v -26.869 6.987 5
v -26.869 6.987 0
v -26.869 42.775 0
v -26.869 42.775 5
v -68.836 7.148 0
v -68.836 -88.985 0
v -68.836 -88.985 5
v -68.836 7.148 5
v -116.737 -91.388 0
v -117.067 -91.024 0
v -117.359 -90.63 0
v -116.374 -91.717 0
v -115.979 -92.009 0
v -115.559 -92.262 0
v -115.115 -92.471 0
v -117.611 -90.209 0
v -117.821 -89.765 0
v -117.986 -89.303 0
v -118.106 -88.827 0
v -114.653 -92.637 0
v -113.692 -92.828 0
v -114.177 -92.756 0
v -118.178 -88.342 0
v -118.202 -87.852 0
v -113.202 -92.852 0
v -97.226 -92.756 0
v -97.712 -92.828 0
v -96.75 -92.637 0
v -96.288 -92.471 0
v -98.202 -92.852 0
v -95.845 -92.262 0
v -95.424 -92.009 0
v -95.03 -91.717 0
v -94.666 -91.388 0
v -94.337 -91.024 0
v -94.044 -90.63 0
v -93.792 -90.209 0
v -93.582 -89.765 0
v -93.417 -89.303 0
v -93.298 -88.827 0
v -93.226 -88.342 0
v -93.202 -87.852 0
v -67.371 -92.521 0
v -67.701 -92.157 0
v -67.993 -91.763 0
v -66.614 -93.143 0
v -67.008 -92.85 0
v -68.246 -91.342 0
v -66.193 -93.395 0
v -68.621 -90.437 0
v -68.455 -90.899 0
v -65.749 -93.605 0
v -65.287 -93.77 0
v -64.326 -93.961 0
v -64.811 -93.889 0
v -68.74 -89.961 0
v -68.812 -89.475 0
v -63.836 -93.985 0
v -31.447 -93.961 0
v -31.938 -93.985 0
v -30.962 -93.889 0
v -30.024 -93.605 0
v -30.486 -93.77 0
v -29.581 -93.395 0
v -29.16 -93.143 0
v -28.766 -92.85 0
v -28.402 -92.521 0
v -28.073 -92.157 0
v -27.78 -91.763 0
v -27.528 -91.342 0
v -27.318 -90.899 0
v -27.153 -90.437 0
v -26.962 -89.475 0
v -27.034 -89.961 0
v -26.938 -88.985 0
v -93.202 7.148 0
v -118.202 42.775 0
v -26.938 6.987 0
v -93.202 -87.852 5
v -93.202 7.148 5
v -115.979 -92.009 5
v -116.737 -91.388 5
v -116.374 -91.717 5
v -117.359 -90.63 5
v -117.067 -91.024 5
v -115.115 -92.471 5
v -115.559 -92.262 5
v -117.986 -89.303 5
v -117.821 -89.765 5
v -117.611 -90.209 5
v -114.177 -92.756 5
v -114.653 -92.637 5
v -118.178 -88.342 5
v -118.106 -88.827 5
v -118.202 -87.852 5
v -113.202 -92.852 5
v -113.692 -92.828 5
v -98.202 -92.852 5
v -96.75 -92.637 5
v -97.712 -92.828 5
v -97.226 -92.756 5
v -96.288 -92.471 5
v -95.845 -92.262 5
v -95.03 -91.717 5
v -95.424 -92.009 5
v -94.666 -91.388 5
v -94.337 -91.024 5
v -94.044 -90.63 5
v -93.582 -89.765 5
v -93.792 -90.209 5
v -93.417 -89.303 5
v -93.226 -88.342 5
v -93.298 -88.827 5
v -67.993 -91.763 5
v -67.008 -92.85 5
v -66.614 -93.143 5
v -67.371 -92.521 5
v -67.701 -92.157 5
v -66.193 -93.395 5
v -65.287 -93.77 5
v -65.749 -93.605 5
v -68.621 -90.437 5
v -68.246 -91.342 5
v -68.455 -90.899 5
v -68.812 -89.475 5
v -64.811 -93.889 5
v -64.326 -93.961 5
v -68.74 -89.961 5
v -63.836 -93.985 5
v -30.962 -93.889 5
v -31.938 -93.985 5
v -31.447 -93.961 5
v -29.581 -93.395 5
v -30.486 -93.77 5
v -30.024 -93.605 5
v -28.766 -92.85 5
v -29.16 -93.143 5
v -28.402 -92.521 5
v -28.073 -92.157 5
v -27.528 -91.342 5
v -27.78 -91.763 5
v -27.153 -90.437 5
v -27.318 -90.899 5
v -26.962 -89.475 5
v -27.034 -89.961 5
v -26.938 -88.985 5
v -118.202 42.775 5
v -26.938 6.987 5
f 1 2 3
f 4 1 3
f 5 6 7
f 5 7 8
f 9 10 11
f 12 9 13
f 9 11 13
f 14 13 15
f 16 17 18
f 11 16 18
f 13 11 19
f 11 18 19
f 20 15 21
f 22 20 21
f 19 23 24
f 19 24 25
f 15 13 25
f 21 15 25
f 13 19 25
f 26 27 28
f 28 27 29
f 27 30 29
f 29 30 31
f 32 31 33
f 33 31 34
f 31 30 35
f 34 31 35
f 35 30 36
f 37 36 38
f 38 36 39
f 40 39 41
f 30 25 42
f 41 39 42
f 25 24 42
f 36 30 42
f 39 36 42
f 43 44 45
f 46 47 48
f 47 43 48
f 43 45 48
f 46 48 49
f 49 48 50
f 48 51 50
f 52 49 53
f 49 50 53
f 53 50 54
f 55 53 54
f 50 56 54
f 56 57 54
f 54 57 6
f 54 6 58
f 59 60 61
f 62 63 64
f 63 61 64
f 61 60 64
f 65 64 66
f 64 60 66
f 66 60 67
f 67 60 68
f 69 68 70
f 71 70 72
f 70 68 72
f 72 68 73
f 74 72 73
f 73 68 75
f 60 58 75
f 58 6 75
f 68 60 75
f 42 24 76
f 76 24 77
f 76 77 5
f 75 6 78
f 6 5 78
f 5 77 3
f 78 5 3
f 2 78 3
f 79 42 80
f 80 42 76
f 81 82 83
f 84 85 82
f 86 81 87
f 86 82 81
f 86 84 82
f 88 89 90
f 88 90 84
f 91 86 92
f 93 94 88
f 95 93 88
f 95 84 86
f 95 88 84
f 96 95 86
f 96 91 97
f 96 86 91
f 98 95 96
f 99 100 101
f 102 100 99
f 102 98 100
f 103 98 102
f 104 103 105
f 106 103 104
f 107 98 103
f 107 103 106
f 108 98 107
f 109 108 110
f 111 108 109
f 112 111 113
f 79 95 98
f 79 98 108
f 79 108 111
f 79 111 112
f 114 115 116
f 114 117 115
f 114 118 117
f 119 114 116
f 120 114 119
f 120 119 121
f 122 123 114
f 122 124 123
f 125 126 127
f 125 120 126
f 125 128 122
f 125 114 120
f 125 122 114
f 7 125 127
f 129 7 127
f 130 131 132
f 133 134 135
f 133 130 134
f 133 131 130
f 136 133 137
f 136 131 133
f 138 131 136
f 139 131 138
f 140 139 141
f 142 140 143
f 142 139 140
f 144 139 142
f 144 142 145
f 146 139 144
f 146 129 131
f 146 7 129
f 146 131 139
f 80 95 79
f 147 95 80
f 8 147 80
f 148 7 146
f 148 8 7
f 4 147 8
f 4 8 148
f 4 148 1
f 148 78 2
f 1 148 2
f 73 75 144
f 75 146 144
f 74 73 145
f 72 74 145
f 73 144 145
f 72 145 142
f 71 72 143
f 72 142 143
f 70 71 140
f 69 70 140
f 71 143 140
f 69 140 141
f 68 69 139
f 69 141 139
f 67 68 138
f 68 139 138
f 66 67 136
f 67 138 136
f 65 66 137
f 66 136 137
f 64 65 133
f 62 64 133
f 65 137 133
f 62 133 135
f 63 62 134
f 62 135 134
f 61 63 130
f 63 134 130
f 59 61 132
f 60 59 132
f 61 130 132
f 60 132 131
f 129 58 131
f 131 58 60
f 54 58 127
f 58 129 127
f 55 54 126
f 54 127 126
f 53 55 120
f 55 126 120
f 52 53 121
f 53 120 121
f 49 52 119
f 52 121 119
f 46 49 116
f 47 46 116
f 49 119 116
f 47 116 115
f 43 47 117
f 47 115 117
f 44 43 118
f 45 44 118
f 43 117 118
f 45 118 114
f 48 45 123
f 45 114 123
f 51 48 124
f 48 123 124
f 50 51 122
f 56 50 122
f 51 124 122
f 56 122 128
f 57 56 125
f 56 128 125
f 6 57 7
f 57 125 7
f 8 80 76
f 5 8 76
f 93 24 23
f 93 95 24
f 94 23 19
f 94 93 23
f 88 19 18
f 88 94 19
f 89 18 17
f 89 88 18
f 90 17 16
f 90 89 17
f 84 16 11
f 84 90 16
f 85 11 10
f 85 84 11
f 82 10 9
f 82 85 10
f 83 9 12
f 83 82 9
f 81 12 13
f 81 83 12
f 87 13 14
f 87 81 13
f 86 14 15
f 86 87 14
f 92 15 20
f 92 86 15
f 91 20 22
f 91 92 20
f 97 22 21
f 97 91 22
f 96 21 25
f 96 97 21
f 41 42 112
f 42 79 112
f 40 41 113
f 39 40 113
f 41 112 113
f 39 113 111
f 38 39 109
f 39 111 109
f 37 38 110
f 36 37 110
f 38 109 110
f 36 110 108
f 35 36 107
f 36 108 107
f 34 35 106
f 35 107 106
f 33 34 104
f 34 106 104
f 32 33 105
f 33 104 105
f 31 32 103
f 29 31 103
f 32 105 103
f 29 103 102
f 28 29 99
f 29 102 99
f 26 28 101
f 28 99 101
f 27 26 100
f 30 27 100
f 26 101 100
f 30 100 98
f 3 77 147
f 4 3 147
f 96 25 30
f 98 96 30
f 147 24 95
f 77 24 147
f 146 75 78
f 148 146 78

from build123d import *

# Parameters (mm, degrees)
F0_W     = 41.33233428
F0_H     = 35.7883912511
F1_DEPTH = 5
F2_W     = 41.8983511627
F2_H     = 101.1332413182
F3_DEPTH = 5
F4_DEPTH = 25
F5_DEPTH = 25
F6_W     = 25
F6_H     = 100
F7_DEPTH = 5
F8_R     = 5


with BuildPart() as f1:
    # F0 (on Top) → F1 (new body)
    with BuildSketch(Plane.XY):
        with Locations((-47.535456717, 24.881032994)):
            Rectangle(F0_W, F0_H)
    extrude(amount=F1_DEPTH)

    # F2 (on Top) → F3 (join)
    with BuildSketch(Plane.XY):
        with Locations((-47.8867311031, -43.418653775)):
            Rectangle(F2_W, F2_H)
    extrude(amount=F3_DEPTH)

    # F4 (add): a face of the model
    f4_faces = [f1.faces().sort_by_distance(p)[0] for p in [
        (-68.201623857, 24.9615977518, 2.5),
    ]]
    extrude(f4_faces, amount=F4_DEPTH)

    # F5 (add): a face of the model
    f5_faces = [f1.faces().sort_by_distance(p)[0] for p in [
        (-93.201623857, 24.9615977518, 2.5),
    ]]
    extrude(f5_faces, amount=F5_DEPTH)

    # F6 (on Top) → F7 (join)
    with BuildSketch(Plane.XY):
        with Locations((-105.701623857, -42.8520331159)):
            Rectangle(F6_W, F6_H)
    extrude(amount=F7_DEPTH)

    # F8
    f8_edges = [f1.edges().sort_by_distance(p)[0] for p in [
        (-118.201624, -92.852033, 2.5),
        (-93.201624, -92.852033, 2.5),
        (-68.835907, -93.985274, 2.5),
        (-26.937556, -93.985274, 2.5),
    ]]
    fillet(f8_edges, radius=F8_R)


solid = f1.part
